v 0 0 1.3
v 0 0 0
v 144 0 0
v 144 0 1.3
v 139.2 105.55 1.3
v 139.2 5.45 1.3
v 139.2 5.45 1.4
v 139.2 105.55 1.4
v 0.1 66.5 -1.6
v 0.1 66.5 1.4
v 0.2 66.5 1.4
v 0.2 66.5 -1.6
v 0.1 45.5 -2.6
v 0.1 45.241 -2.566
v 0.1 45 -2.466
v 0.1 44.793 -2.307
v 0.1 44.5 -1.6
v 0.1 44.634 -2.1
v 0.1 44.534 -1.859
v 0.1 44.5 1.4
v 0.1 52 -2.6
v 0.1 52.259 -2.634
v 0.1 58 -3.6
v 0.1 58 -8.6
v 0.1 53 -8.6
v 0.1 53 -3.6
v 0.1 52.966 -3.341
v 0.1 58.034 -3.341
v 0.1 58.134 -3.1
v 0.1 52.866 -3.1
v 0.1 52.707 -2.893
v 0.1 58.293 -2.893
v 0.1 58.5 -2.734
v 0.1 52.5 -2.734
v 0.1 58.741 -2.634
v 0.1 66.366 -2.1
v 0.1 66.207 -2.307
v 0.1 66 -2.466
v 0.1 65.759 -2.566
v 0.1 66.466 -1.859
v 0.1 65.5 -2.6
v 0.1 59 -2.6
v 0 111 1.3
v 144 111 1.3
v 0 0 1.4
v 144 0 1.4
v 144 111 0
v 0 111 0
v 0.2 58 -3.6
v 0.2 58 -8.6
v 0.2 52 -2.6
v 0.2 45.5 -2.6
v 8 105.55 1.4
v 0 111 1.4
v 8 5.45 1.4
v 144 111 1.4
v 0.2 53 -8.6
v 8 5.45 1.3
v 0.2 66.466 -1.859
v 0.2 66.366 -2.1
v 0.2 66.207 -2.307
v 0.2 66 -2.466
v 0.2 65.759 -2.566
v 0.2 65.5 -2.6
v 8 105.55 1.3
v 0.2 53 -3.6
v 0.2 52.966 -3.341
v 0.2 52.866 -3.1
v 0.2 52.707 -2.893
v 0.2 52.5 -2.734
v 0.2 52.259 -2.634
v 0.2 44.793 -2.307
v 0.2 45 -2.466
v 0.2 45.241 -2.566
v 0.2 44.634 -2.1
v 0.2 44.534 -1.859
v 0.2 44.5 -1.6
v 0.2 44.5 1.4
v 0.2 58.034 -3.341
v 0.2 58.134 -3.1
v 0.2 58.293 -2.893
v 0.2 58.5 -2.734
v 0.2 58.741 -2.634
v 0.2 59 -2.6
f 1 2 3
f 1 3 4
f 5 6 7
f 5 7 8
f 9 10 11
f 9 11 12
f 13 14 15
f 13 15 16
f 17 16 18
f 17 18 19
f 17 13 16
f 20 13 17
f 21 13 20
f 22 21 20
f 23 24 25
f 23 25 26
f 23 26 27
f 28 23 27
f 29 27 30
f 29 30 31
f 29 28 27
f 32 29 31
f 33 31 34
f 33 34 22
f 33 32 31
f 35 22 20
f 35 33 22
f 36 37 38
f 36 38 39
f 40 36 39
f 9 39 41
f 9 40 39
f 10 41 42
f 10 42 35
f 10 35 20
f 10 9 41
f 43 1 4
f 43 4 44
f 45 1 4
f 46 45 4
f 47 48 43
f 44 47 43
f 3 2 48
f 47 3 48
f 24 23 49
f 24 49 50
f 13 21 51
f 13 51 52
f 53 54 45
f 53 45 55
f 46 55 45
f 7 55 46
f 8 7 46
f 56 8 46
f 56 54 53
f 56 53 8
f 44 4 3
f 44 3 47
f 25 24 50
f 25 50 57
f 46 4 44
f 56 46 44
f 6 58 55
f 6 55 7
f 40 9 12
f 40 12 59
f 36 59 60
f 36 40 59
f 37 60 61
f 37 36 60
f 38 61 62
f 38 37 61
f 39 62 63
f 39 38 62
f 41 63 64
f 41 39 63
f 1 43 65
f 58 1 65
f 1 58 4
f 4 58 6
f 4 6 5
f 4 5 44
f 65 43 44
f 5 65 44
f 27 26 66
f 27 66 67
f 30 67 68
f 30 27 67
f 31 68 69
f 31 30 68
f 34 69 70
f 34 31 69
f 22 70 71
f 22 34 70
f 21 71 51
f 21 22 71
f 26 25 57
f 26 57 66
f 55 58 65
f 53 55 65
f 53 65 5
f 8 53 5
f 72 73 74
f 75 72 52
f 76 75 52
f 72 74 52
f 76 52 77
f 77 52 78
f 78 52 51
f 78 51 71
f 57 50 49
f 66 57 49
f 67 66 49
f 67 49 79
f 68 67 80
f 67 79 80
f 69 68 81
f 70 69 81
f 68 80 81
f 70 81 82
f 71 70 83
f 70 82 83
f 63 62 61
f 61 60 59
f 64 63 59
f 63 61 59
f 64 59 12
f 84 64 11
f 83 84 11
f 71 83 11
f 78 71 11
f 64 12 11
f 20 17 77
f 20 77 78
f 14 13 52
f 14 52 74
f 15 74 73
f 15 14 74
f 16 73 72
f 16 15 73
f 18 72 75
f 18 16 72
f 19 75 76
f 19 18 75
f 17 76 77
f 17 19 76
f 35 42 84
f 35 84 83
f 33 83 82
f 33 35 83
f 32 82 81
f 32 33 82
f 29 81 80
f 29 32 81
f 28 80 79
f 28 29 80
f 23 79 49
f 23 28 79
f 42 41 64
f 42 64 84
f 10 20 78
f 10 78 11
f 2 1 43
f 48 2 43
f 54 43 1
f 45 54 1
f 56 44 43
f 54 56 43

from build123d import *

# Parameters (mm, degrees)
SKETCH1_W             = 144
SKETCH1_H             = 111
BOSS_EXTRUDE1_DEPTH   = 1.3
BOSS_EXTRUDE2_DEPTH   = 0.1
SKETCH5_W             = 131.2
SKETCH5_H             = 100.1
BOSS_EXTRUDE3_DEPTH   = 0.1
BODY_MOVE_COPY1_ANGLE = 90


with BuildPart() as part:
    # Sketch1 → Boss-Extrude1 (new body)
    with BuildSketch(Plane.XY):
        with Locations((72, 55.5)):
            Rectangle(SKETCH1_W, SKETCH1_H)
    extrude(amount=BOSS_EXTRUDE1_DEPTH)

    # Sketch2 → Boss-Extrude2 (add)
    with BuildSketch(Plane.XY.offset(1.3)):
        with BuildLine():
            Line((0, 66.5), (-3, 66.5))
            ThreePointArc((-3, 66.5), (-3.707106781, 66.207106781), (-4, 65.5))
            Line((-4, 65.5), (-4, 59))
            ThreePointArc((-4, 59), (-4.292893219, 58.292893219), (-5, 58))
            Line((-5, 58), (-10, 58))
            Line((-10, 58), (-10, 53))
            Line((-10, 53), (-5, 53))
            ThreePointArc((-5, 53), (-4.292893219, 52.707106781), (-4, 52))
            Line((-4, 52), (-4, 45.5))
            ThreePointArc((-4, 45.5), (-3.707106781, 44.792893219), (-3, 44.5))
            Line((-3, 44.5), (0, 44.5))
            Line((0, 44.5), (0, 66.5))
        make_face()
    extrude(amount=-BOSS_EXTRUDE2_DEPTH)


with BuildPart() as body_2:
    # Sketch5 → Boss-Extrude3 (new body)
    with BuildSketch(Plane.XY.offset(1.3)):
        Polygon((144, 111), (0, 111), (0, 66.5), (0, 44.5), (0, 0), (144, 0), align=None)
        with Locations((73.6, 55.5)):
            Rectangle(SKETCH5_W, SKETCH5_H, mode=Mode.SUBTRACT)
    extrude(amount=BOSS_EXTRUDE3_DEPTH)


with BuildPart() as body_3:
    # Split1: the piece on the far side of the plane
    add(part.part)
    split(bisect_by=Plane(origin=(0, 0, 1.3), x_dir=(0, 0, 1), z_dir=(1, 0, 0)), keep=Keep.BOTTOM)


with BuildPart() as part_1:
    add(part.part)

    # Split1
    split(bisect_by=Plane(origin=(0, 0, 1.3), x_dir=(0, 0, 1), z_dir=(1, 0, 0)), keep=Keep.TOP)


with BuildPart() as body_3_1:
    # Body-Move/Copy1: moved
    add(body_3.part.rotate(Axis((0, 0, 1.4), (0, -1, 0)), BODY_MOVE_COPY1_ANGLE))


solid = Compound([body_2.part, part_1.part, body_3_1.part])
